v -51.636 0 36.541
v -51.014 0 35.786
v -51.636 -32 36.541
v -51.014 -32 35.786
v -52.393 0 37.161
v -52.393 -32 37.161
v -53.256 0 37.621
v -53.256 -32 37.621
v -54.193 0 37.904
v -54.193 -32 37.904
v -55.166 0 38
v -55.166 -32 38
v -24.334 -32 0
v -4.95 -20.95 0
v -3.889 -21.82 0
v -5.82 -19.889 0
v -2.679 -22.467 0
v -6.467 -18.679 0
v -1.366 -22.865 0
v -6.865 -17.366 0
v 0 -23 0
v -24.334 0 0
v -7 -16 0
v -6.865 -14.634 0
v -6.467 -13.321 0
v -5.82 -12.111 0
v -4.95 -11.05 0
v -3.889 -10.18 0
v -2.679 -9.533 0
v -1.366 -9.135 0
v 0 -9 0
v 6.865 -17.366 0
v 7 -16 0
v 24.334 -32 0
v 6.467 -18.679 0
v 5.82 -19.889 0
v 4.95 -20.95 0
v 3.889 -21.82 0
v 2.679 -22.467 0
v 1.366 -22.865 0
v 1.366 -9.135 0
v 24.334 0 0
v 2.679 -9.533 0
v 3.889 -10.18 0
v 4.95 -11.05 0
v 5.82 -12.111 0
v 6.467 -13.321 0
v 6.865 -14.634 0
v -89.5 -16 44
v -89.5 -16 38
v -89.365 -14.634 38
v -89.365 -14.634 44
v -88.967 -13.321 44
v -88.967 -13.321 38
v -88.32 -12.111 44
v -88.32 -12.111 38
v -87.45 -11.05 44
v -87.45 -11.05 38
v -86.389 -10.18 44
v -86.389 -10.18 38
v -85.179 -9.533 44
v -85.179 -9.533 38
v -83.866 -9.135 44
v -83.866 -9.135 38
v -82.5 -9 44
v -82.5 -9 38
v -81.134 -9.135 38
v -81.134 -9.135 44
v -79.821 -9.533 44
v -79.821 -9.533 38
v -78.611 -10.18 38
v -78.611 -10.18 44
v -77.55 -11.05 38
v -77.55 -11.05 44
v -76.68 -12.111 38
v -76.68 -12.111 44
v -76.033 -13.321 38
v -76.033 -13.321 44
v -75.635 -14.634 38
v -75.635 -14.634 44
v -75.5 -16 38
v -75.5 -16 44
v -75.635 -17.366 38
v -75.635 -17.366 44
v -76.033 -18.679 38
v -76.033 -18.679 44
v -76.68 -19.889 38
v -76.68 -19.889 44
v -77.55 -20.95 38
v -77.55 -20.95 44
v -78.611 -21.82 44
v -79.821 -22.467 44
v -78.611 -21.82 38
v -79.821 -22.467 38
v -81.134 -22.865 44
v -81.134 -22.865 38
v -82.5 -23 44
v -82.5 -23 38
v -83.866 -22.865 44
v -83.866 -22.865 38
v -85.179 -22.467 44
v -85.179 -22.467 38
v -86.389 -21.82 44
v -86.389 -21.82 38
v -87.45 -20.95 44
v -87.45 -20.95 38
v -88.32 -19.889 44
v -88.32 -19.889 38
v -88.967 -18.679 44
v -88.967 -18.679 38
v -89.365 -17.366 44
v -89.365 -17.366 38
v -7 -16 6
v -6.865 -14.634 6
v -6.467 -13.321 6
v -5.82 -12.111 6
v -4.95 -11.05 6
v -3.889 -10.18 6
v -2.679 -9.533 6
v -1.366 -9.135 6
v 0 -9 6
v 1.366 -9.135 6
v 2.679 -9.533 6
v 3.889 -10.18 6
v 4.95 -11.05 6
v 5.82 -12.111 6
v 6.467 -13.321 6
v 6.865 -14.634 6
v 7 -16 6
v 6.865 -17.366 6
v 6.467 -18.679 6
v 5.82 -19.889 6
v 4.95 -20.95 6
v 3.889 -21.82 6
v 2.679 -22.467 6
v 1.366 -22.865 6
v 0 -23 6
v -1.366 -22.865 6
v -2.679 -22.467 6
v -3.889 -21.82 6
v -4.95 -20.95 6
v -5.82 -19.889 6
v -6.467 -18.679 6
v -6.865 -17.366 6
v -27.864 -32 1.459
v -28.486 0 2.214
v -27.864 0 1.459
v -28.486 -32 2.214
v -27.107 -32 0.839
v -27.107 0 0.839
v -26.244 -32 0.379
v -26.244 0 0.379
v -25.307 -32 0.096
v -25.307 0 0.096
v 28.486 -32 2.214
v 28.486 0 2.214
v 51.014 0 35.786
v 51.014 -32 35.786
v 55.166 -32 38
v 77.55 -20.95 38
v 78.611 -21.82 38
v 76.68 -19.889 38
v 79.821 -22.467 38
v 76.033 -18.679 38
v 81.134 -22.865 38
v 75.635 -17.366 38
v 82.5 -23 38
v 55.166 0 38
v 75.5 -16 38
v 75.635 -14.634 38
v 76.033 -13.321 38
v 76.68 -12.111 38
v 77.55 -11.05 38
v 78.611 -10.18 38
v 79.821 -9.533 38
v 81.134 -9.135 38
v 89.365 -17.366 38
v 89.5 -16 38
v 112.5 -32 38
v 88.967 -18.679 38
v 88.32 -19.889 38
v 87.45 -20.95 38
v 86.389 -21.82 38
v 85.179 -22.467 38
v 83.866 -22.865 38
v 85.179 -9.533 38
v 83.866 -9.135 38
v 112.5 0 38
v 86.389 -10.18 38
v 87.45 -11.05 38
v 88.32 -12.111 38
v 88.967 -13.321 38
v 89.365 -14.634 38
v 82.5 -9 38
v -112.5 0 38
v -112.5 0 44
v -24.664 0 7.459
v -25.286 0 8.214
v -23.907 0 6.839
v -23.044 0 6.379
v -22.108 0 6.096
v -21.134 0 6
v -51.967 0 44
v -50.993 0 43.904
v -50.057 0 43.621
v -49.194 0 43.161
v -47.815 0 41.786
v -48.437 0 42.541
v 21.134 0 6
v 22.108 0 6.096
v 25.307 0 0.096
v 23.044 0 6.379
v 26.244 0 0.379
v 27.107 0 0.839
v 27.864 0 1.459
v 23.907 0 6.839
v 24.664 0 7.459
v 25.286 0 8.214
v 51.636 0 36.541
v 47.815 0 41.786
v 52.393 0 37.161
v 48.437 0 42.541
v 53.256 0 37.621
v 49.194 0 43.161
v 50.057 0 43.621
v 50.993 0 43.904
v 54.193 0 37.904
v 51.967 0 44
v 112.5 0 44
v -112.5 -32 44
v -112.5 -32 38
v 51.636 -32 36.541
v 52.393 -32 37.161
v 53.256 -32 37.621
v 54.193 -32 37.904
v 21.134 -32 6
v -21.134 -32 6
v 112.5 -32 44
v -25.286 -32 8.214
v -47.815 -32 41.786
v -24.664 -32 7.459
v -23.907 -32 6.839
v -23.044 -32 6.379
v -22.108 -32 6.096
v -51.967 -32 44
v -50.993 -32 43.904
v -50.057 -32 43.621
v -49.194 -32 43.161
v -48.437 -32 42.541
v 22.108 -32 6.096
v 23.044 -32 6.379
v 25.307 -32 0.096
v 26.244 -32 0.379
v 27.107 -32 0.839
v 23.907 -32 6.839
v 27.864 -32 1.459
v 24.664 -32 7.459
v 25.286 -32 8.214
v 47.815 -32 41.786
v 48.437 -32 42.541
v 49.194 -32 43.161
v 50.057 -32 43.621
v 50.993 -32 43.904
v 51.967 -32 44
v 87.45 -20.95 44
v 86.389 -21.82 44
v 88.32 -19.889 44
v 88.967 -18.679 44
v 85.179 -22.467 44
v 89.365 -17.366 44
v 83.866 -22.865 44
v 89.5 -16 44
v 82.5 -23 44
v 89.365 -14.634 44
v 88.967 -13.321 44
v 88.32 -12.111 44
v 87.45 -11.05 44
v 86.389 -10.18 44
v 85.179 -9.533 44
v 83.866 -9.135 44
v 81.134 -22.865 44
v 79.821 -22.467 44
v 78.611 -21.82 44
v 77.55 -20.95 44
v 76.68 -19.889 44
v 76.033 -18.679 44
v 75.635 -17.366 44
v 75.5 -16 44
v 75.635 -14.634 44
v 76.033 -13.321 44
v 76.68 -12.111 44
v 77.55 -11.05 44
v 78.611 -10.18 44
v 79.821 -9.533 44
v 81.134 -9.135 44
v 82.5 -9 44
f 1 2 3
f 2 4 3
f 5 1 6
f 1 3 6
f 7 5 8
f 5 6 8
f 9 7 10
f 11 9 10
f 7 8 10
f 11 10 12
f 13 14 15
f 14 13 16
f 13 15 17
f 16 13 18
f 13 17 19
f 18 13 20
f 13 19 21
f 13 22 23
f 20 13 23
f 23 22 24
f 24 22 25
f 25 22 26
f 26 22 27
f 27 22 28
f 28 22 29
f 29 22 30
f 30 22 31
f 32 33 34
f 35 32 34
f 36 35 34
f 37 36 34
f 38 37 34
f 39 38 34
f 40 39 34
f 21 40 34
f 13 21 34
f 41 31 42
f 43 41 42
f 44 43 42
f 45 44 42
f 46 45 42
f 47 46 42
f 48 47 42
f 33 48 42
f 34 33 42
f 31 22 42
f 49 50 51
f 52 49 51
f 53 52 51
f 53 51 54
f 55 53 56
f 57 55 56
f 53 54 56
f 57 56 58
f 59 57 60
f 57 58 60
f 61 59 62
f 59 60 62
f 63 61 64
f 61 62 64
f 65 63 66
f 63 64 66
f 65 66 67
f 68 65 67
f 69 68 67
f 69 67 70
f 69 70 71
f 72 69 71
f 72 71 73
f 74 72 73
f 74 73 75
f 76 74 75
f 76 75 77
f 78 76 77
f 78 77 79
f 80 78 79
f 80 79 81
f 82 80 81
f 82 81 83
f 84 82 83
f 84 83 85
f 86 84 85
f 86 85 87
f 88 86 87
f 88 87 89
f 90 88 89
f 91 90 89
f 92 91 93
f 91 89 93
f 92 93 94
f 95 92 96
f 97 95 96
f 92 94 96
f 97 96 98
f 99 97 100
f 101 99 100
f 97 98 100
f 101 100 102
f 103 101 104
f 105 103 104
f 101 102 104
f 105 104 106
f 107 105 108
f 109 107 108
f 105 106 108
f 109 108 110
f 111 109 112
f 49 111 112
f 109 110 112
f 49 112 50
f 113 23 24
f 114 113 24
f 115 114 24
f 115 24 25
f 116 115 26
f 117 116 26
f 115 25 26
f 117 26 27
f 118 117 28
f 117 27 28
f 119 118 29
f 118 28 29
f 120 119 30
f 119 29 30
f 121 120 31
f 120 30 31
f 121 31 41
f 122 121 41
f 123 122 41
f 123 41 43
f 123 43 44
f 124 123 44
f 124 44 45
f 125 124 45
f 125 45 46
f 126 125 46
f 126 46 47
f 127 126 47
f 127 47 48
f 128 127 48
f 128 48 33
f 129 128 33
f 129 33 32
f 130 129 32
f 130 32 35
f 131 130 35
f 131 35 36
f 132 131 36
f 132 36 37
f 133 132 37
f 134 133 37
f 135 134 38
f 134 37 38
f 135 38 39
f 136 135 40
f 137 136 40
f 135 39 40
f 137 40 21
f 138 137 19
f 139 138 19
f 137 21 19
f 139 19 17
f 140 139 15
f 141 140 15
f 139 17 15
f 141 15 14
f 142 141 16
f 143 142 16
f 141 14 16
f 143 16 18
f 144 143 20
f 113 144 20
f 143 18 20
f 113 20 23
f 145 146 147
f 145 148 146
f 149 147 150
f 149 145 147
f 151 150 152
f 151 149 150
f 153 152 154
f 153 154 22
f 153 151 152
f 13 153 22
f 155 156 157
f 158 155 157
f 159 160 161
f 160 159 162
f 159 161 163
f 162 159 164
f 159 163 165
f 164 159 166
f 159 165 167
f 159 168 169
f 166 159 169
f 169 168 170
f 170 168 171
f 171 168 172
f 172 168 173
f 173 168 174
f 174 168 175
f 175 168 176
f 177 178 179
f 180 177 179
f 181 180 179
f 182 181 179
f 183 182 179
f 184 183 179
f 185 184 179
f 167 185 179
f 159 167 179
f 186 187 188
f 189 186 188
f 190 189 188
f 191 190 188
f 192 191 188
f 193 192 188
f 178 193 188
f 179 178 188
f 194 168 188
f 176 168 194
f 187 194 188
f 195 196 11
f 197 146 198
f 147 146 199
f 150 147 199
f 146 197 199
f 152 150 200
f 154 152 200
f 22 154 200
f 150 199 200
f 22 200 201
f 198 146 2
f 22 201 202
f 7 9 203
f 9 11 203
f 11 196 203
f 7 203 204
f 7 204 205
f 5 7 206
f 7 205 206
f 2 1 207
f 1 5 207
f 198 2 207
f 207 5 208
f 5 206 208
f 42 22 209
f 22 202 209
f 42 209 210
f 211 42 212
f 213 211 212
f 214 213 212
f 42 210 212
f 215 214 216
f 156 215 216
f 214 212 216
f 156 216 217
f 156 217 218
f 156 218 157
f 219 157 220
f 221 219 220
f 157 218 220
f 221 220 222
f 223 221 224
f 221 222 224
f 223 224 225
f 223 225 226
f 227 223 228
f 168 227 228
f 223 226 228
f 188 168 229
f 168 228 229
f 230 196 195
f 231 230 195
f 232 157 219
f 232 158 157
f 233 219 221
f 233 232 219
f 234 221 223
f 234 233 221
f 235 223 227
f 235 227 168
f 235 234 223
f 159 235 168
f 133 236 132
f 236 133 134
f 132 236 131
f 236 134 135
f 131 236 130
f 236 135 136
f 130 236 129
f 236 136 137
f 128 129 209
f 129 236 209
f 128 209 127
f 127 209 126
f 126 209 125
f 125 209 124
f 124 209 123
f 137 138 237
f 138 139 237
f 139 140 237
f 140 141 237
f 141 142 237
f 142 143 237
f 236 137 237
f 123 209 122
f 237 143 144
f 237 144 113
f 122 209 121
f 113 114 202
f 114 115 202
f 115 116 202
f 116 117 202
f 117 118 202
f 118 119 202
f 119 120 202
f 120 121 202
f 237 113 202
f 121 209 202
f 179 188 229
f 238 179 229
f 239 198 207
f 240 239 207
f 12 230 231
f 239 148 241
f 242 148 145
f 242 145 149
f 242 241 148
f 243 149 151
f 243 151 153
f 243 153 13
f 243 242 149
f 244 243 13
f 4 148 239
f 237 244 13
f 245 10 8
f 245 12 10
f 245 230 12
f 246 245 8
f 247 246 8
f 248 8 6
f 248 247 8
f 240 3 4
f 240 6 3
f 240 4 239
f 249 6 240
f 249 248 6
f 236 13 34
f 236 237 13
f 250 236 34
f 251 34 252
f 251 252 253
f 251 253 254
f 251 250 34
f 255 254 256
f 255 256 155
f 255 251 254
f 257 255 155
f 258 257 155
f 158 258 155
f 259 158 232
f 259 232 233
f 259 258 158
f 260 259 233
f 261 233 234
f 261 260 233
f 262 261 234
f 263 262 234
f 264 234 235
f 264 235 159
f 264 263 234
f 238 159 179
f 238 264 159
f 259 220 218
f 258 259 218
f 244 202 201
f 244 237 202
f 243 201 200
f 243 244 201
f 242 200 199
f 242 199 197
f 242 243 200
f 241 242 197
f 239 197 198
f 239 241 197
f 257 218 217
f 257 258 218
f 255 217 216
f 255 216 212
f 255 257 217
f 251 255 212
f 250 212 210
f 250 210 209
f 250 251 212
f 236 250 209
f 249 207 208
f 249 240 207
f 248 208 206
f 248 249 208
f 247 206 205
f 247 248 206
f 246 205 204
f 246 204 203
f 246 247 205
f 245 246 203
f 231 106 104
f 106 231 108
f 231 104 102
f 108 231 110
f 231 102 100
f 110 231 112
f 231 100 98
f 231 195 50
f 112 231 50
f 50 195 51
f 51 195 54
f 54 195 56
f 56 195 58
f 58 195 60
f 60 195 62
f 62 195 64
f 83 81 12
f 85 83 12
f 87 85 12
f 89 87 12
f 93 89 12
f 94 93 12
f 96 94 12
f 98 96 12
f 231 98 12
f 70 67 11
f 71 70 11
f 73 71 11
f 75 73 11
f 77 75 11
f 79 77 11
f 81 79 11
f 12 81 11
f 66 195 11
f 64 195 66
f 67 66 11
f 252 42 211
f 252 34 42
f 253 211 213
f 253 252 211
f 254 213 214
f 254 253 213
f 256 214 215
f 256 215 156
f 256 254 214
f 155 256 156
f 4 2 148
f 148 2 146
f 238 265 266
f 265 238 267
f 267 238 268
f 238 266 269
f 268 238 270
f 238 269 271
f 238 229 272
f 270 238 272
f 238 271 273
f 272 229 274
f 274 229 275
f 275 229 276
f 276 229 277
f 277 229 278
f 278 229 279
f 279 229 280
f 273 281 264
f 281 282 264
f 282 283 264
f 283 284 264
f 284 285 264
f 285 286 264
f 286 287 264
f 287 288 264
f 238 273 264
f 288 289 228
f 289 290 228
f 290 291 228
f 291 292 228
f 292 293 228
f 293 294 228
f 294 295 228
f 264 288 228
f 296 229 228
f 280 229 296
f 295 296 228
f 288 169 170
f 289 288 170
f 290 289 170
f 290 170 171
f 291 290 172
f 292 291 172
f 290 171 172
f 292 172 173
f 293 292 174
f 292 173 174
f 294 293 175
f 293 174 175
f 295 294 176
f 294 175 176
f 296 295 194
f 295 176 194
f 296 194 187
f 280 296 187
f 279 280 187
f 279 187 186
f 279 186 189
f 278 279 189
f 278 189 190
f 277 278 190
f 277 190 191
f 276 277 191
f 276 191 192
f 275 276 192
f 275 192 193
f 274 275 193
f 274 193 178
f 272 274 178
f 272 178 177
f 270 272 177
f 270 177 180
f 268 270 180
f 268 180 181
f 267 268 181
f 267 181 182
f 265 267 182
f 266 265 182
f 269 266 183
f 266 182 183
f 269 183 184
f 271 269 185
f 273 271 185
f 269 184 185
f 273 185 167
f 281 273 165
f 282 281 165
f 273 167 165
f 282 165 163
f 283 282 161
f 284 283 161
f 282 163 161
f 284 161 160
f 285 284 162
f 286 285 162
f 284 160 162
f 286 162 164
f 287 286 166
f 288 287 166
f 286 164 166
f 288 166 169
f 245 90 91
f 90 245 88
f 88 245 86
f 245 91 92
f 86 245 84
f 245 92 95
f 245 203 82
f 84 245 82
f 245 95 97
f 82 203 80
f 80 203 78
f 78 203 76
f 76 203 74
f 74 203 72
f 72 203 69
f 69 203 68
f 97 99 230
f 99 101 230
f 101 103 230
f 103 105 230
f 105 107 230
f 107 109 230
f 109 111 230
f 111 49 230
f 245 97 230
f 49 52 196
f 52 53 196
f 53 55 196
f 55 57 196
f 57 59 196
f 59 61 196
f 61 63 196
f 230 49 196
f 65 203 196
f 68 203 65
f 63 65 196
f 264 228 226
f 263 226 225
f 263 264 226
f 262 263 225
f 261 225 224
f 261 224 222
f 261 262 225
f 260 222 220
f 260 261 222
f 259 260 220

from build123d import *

# Parameters (mm, degrees)
F1_DEPTH = 32
F2_R     = 5
F4_D     = 14
F6_D     = 14


with BuildPart() as f1:
    # F0 (on Front) → F1 (new body)
    with BuildSketch(Plane.XZ):
        Polygon((-52.5, 38), (-27, 0), (27, 0), (52.5, 38), (112.5, 38), (112.5, 44), (49.300583, 44), (23.800583, 6), (-23.800583, 6), (-49.300583, 44), (-112.5, 44), (-112.5, 38), align=None)
    extrude(amount=F1_DEPTH)

    # F2
    f2_edges = [f1.edges().sort_by_distance(p)[0] for p in [
        (-49.300583, -16, 44),
        (-23.800583, -16, 6),
        (23.800583, -16, 6),
        (49.300583, -16, 44),
        (52.5, -16, 38),
        (27, -16, 0),
        (-27, -16, 0),
        (-52.5, -16, 38),
    ]]
    fillet(f2_edges, radius=F2_R)

    # F4 (through all)
    with Locations(Plane.XY.offset(6)):
        with Locations((0, -16)):
            Hole(F4_D / 2)

    # F6 (through all)
    with Locations(Plane.XY.offset(44)):
        with Locations((-82.5, -16), (82.5, -16)):
            Hole(F6_D / 2)


solid = f1.part
